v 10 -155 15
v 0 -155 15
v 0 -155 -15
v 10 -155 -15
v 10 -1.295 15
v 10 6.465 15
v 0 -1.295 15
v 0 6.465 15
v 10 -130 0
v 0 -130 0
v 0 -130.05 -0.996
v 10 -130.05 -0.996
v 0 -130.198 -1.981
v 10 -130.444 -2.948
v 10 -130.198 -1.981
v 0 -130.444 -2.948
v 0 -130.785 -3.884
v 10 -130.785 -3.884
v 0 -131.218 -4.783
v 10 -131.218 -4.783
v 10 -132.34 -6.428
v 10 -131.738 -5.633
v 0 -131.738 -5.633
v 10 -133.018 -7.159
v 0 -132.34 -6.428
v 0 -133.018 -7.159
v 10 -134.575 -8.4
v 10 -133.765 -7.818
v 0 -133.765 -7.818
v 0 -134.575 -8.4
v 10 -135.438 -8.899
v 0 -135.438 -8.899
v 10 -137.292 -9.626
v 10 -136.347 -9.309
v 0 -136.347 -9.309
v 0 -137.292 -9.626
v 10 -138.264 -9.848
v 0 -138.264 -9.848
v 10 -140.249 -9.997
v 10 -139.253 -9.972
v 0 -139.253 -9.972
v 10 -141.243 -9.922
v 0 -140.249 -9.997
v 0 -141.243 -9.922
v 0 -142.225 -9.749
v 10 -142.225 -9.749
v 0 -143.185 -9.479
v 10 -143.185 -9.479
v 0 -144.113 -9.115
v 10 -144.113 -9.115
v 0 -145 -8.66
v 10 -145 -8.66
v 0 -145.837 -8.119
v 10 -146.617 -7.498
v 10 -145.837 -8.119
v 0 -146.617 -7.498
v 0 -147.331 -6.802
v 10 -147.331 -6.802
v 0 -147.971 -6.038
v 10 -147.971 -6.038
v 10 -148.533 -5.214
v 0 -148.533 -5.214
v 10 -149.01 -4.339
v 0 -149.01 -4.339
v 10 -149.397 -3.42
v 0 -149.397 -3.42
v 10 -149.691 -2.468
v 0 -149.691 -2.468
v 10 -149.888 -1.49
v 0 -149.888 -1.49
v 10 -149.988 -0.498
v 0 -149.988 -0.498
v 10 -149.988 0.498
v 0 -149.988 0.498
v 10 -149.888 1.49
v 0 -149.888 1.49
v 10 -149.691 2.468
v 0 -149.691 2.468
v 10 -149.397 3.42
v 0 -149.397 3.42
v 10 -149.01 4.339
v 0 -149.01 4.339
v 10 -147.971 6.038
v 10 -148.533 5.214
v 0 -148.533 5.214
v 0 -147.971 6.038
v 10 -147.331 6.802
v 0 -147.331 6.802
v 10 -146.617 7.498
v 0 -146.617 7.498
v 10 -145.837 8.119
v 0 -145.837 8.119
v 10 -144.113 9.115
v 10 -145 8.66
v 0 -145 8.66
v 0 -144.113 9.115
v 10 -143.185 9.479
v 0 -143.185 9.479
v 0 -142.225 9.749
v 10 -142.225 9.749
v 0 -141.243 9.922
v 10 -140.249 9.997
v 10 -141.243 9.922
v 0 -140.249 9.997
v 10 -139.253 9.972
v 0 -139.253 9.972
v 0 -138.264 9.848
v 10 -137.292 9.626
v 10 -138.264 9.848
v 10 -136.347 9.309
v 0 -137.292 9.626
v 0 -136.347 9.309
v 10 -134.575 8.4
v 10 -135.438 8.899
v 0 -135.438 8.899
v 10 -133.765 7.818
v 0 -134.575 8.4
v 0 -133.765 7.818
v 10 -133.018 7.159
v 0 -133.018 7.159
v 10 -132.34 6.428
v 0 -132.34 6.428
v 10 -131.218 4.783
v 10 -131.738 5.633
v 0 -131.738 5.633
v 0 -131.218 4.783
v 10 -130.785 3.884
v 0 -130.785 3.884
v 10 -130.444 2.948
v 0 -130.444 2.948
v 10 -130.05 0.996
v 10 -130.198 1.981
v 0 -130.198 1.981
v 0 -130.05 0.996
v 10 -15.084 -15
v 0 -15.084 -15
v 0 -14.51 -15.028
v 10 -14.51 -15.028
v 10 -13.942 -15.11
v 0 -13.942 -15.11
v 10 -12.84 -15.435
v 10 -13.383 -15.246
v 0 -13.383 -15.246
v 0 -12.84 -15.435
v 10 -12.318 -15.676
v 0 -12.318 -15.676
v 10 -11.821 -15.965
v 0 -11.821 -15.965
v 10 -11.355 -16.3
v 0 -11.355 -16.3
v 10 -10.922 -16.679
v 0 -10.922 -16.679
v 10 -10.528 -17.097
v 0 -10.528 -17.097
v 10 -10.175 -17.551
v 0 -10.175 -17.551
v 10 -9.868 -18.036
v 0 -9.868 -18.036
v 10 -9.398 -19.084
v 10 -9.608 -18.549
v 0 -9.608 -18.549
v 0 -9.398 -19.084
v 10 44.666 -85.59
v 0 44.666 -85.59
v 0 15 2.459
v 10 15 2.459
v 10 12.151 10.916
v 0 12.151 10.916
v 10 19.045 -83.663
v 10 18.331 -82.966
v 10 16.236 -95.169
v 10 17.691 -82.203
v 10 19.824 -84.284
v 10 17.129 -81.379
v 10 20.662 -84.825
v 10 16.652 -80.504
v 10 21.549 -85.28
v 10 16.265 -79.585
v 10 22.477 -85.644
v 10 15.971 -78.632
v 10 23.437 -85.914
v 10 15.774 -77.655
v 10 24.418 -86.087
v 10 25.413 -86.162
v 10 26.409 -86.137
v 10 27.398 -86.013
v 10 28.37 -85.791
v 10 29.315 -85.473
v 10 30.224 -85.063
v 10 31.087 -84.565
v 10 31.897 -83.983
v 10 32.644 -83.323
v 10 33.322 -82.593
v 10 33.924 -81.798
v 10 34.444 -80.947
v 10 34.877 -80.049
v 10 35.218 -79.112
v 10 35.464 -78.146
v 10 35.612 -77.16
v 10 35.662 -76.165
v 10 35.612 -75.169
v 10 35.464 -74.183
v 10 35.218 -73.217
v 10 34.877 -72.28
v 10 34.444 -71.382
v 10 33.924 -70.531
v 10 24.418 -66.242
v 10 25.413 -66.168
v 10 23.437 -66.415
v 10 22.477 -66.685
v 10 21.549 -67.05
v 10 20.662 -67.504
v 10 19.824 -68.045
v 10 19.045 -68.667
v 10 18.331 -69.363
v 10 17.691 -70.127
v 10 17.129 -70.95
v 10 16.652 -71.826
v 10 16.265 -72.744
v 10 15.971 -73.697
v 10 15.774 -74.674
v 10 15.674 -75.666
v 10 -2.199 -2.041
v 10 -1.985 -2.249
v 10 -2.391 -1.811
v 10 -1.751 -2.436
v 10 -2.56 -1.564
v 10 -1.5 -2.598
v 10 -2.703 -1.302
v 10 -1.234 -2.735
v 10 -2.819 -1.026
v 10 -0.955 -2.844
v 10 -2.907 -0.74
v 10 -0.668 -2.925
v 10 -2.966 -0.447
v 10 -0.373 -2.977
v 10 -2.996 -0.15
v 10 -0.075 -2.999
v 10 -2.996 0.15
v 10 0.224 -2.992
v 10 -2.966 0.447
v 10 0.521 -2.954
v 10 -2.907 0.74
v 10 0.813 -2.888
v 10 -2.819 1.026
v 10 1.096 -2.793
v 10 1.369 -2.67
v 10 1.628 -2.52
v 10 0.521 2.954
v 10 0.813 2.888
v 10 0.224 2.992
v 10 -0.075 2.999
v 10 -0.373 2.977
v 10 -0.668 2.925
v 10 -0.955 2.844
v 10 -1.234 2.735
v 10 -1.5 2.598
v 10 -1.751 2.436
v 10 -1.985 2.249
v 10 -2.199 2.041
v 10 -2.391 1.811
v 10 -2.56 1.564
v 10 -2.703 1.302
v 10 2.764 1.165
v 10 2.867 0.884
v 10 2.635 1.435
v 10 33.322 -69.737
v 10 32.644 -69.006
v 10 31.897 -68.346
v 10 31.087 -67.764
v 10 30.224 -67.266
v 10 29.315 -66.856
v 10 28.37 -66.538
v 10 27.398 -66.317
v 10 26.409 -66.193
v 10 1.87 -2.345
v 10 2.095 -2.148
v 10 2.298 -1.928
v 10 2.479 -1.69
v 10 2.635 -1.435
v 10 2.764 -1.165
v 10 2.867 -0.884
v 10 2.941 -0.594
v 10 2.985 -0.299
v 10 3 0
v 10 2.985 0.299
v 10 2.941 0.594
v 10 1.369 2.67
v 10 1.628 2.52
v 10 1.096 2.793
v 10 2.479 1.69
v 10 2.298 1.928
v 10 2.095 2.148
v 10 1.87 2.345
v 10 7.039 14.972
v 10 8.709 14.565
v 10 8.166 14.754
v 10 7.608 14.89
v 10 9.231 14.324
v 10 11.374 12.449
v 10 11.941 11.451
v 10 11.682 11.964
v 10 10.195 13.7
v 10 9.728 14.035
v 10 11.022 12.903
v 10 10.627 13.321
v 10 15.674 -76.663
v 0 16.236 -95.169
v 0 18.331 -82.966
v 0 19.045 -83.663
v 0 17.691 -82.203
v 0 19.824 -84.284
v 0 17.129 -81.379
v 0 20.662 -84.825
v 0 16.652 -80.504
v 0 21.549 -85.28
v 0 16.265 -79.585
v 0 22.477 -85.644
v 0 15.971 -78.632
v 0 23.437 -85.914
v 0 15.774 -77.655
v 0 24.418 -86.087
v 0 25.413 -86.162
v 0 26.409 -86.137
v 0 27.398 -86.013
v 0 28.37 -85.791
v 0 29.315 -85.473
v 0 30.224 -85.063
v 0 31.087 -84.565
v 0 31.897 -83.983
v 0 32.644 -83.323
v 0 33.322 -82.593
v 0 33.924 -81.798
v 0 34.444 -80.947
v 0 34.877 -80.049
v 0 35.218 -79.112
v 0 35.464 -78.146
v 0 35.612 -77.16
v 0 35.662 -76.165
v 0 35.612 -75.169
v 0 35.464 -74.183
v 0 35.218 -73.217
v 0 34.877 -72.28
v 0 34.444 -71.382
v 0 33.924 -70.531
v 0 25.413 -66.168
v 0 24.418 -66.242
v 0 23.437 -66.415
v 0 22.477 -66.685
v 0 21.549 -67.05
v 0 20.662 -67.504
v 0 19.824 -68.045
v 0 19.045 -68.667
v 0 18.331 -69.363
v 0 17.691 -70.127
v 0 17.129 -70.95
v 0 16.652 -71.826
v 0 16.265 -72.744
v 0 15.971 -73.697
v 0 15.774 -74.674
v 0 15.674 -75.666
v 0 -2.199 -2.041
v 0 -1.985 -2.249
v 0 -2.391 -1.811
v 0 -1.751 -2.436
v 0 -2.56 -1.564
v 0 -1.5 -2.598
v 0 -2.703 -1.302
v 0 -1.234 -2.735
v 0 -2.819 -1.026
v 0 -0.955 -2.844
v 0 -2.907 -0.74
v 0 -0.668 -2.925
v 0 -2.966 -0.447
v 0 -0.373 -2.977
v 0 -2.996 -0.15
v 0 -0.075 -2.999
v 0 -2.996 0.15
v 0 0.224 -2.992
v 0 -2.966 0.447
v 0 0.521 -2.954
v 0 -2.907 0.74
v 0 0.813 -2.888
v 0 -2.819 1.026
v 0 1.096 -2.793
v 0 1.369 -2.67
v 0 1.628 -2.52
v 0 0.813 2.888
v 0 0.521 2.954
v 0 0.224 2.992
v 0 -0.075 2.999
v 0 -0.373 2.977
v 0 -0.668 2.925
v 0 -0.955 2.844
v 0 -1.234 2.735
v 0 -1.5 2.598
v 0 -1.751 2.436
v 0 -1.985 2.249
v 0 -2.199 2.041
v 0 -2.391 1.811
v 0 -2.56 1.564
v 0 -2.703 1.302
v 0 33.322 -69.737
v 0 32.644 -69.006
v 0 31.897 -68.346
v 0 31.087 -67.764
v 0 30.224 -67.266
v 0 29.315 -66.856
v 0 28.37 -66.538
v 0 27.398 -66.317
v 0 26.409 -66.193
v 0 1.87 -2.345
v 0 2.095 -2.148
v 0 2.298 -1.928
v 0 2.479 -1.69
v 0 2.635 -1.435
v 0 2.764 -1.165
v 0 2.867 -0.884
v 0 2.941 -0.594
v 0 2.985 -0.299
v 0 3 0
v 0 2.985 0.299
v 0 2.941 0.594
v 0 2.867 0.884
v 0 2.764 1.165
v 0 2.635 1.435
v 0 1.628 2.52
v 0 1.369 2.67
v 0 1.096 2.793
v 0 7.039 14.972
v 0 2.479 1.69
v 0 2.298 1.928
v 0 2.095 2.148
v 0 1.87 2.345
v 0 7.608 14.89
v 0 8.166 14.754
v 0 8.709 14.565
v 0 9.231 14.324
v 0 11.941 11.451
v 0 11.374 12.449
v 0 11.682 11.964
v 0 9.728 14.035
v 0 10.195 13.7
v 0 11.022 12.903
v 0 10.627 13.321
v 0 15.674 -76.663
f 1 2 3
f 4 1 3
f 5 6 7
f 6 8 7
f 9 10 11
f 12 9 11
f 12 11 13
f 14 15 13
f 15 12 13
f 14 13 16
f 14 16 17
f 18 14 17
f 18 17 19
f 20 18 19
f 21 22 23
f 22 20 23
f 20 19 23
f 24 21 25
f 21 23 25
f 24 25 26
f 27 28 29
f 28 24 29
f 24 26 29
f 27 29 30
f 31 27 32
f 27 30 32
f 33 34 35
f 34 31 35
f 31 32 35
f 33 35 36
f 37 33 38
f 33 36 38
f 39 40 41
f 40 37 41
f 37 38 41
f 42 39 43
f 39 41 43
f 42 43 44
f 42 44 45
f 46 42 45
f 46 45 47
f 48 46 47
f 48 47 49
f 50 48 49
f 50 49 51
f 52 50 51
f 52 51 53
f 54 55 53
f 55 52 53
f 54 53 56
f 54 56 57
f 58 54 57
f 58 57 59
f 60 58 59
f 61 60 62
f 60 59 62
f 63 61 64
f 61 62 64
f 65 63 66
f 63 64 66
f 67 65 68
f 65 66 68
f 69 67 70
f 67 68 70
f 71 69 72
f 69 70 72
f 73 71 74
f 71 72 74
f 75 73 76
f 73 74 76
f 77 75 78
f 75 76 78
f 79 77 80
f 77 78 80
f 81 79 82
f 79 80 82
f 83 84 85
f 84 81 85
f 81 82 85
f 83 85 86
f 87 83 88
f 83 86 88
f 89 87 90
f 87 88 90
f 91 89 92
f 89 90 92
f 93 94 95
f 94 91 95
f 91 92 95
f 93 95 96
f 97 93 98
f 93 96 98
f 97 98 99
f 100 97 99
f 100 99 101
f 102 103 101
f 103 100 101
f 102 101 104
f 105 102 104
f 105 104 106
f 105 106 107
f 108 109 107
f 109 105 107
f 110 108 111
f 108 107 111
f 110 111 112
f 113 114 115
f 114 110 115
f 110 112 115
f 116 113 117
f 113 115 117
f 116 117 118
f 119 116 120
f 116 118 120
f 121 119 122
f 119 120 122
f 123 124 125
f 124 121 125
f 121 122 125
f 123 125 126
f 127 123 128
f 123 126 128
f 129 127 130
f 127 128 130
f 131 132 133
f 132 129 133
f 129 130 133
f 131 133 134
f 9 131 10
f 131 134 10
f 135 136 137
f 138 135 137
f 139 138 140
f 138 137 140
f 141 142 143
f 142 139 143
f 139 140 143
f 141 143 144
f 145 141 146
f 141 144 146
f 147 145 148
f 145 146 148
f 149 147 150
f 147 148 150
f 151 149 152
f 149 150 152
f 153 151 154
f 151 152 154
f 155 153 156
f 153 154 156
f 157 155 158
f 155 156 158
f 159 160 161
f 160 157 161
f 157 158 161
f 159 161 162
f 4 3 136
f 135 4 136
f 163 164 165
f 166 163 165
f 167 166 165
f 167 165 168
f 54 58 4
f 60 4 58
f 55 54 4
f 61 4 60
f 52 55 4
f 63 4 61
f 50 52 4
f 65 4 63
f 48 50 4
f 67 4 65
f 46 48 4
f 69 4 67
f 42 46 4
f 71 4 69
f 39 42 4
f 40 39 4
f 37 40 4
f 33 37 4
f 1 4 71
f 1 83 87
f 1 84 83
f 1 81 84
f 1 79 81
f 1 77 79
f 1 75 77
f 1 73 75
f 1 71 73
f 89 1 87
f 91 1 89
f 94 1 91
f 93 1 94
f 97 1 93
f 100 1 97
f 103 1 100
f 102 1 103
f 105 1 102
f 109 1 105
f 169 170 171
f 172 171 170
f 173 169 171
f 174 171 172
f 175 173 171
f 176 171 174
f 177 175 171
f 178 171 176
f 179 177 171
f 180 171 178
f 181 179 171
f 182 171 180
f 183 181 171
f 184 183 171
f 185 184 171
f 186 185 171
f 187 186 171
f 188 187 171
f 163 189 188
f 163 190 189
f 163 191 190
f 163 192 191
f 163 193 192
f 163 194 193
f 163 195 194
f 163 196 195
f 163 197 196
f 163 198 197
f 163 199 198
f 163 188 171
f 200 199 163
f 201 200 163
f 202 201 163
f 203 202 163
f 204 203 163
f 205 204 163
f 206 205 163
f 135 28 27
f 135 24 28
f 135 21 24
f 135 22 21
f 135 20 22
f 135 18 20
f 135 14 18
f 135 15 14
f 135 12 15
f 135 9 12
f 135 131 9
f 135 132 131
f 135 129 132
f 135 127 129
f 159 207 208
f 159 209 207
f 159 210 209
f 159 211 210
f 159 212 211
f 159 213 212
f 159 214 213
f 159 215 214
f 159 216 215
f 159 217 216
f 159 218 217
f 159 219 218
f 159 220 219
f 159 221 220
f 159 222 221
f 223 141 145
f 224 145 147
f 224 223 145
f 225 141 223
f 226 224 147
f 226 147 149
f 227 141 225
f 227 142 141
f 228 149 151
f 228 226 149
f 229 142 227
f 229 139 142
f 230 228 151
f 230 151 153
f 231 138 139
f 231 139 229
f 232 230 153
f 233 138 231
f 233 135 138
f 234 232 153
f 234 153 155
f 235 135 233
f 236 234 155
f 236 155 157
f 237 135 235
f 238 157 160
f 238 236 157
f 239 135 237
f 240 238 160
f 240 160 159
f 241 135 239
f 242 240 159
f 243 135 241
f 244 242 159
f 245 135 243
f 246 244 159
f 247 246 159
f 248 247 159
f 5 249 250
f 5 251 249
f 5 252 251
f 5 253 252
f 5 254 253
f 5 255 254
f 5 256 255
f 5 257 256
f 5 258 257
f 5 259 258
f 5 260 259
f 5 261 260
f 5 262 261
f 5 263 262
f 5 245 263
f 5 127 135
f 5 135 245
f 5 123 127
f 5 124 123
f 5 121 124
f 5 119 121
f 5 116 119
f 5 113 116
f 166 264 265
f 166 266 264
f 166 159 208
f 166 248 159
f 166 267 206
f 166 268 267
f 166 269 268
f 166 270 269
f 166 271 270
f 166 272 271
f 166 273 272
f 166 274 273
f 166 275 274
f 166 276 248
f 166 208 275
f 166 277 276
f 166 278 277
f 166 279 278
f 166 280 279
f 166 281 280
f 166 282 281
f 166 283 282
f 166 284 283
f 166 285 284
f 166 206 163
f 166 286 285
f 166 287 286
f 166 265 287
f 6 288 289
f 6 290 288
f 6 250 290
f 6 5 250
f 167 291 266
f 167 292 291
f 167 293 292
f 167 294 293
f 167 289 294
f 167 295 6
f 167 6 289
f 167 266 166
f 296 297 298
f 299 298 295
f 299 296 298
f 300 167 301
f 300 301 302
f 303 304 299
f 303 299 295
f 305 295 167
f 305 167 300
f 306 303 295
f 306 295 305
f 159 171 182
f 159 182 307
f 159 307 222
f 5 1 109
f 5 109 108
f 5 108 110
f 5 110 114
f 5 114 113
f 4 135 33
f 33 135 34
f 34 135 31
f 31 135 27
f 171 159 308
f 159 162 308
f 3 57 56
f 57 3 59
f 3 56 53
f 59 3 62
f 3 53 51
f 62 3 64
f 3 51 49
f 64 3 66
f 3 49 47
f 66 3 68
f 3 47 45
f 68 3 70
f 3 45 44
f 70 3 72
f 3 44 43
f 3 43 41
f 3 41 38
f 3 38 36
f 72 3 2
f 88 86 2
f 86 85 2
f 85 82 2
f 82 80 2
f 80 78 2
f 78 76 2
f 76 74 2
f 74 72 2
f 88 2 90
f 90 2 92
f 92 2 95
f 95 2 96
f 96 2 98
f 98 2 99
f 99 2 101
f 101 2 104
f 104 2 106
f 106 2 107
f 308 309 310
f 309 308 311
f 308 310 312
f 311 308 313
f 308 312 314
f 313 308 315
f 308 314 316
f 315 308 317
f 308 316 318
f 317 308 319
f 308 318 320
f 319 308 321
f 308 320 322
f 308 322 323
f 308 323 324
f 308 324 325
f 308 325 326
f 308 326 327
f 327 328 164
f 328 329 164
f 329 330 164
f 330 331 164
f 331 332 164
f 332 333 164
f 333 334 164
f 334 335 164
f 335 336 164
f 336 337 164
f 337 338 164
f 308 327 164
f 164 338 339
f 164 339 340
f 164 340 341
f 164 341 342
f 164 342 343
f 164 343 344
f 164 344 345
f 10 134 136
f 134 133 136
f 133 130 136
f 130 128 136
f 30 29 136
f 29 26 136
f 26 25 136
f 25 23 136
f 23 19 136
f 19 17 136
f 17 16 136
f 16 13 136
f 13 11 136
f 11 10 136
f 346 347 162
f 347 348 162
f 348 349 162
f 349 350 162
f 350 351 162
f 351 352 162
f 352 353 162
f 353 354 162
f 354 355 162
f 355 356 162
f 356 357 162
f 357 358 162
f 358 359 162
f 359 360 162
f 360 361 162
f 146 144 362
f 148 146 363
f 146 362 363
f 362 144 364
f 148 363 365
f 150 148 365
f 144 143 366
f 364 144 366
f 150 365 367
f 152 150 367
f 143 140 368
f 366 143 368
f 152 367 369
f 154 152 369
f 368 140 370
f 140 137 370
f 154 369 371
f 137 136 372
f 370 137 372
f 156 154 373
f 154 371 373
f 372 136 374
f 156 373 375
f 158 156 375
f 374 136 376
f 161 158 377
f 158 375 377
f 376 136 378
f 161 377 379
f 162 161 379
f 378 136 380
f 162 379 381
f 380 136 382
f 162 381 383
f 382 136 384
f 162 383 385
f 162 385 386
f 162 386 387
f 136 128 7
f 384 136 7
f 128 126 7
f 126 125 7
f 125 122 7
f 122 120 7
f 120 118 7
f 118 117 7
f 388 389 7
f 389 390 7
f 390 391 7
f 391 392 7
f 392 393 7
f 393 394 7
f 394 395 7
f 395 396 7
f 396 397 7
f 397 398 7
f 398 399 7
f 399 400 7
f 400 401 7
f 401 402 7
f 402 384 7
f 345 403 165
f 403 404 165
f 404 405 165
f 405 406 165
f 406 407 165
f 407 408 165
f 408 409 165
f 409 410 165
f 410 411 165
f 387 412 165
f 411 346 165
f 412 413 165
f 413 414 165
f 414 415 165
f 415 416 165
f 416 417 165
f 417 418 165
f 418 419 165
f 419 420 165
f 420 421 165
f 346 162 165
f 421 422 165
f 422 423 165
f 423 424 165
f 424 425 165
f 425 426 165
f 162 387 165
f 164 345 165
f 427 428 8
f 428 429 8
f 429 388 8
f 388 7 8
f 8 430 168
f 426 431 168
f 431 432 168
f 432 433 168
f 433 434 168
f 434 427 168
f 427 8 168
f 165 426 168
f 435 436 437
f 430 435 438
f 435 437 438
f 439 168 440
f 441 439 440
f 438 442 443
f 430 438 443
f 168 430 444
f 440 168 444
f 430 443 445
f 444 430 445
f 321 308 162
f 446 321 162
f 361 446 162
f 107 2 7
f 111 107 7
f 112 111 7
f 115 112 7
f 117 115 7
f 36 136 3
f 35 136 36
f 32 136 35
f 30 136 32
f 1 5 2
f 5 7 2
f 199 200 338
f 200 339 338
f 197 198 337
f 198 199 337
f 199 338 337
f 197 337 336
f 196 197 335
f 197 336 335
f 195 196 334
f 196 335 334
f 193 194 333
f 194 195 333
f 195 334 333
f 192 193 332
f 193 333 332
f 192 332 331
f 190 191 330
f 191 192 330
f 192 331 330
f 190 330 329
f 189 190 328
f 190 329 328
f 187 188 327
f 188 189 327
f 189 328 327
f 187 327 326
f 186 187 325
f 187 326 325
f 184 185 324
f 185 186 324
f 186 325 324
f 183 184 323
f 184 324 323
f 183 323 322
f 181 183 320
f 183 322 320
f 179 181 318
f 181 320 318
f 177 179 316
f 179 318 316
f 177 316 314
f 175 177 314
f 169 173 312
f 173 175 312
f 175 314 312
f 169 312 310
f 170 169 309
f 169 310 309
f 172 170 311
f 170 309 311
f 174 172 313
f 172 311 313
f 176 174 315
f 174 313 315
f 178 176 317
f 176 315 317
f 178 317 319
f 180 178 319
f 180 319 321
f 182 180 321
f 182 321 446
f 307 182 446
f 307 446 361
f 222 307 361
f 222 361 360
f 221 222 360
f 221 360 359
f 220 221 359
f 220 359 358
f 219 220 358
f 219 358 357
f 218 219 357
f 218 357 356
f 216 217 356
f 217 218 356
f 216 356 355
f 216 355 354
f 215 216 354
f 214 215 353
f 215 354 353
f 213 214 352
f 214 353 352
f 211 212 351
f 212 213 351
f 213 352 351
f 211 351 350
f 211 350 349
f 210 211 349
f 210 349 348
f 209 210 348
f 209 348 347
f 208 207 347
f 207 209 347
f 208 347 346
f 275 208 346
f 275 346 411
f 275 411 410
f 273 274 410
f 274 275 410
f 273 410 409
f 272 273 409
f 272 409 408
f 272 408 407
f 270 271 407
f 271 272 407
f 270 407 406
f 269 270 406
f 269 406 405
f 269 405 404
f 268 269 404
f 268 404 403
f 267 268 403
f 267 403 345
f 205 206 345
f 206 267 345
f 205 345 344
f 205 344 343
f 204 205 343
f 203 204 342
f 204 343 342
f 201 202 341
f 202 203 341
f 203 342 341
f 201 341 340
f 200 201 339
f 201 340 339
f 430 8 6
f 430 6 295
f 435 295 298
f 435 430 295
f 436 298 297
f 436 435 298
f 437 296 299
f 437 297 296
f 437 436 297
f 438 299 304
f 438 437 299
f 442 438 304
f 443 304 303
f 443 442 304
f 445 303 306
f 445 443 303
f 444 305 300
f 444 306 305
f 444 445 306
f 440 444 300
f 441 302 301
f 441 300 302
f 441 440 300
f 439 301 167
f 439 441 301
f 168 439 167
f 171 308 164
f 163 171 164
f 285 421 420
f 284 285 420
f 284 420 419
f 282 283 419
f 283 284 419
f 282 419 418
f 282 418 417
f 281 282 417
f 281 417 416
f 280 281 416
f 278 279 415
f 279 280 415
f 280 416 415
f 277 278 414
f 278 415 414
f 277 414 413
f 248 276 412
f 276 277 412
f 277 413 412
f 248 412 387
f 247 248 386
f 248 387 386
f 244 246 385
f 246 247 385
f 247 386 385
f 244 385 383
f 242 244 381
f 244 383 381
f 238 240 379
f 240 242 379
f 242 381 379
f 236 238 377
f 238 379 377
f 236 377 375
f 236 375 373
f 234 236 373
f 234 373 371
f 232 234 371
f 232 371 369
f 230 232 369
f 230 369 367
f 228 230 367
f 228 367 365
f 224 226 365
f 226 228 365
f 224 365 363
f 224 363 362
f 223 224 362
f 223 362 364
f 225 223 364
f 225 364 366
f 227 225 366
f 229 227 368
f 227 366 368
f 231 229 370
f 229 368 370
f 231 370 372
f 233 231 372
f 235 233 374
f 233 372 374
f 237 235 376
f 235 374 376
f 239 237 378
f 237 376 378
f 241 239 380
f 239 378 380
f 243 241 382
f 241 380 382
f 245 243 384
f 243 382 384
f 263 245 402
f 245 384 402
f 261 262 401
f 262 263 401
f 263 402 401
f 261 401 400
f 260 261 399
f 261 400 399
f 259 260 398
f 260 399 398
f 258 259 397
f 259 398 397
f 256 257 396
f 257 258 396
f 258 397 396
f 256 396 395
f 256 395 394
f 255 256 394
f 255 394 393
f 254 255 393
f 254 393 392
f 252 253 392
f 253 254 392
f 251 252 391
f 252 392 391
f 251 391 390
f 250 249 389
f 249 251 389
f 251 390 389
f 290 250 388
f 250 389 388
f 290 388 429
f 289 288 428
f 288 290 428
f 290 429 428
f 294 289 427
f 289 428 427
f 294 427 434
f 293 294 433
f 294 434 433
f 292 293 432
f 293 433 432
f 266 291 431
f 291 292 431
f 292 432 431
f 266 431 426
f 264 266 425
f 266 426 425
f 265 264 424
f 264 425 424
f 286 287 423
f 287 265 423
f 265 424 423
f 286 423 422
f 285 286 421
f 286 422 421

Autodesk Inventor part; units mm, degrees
ref_plane "YZ Plane" through (0, 0, 0) normal (1, 0, 0) x (0, 1, 0)
ref_plane "XZ Plane" through (0, 0, 0) normal (0, 1, 0) x (-1, 0, 0)
ref_plane "XY Plane" through (0, 0, 0) normal (0, 0, 1) x (1, 0, 0)
sketch "Sketch1" plane through (0, 0, 0) normal (1, 0, 0) x (0, 1, 0)
  circle A0 centre (0, 0) radius 3
  line L0 (6.4648, 15) -> (-155, 15)
  line L1 (-155, 15) -> (-155, -15)
  line L2 (-155, -15) -> (-15.0845, -15)
  line L3 (15, -15) -> (15, 15)
  line L4 (-9.3985, -19.0843) -> (16.2364, -95.1689)
  line L5 (16.2364, -95.1689) -> (44.6661, -85.5902)
  line L6 (44.6661, -85.5902) -> (12.1507, 10.9157)
  line L7 (9.5442, 18.6521) -> (-18.8856, 9.0734)
  arc A1 (-9.3985, -19.0843) -> (-15.0845, -15) centre (-15.0845, -21) ccw
  arc A2 (12.1507, 10.9157) -> (6.4648, 15) centre (6.4648, 9) ccw
  circle A3 centre (-140, 0) radius 10
  circle A4 centre (-140, 0) radius 3
  circle A5 centre (25.6619, -76.1647) radius 10
  dimension "d0" = 6
  dimension "d1" = 170
  dimension "d2" = 30
  dimension "d3" = 110
  dimension "d6" = 108.62
  dimension "d7" = 15
  dimension "d8" = 15
  dimension "d9" = 6
  dimension "d10" = 20
  dimension "d11" = 6
  dimension "d12" = 15
  dimension "d13" = 20
extrude "Extrusion1" add sketch "Sketch1" along normal blind 10 contours A2 L6 L5 L4 A1 L2 L1 L0
properties part number "bogie1"
